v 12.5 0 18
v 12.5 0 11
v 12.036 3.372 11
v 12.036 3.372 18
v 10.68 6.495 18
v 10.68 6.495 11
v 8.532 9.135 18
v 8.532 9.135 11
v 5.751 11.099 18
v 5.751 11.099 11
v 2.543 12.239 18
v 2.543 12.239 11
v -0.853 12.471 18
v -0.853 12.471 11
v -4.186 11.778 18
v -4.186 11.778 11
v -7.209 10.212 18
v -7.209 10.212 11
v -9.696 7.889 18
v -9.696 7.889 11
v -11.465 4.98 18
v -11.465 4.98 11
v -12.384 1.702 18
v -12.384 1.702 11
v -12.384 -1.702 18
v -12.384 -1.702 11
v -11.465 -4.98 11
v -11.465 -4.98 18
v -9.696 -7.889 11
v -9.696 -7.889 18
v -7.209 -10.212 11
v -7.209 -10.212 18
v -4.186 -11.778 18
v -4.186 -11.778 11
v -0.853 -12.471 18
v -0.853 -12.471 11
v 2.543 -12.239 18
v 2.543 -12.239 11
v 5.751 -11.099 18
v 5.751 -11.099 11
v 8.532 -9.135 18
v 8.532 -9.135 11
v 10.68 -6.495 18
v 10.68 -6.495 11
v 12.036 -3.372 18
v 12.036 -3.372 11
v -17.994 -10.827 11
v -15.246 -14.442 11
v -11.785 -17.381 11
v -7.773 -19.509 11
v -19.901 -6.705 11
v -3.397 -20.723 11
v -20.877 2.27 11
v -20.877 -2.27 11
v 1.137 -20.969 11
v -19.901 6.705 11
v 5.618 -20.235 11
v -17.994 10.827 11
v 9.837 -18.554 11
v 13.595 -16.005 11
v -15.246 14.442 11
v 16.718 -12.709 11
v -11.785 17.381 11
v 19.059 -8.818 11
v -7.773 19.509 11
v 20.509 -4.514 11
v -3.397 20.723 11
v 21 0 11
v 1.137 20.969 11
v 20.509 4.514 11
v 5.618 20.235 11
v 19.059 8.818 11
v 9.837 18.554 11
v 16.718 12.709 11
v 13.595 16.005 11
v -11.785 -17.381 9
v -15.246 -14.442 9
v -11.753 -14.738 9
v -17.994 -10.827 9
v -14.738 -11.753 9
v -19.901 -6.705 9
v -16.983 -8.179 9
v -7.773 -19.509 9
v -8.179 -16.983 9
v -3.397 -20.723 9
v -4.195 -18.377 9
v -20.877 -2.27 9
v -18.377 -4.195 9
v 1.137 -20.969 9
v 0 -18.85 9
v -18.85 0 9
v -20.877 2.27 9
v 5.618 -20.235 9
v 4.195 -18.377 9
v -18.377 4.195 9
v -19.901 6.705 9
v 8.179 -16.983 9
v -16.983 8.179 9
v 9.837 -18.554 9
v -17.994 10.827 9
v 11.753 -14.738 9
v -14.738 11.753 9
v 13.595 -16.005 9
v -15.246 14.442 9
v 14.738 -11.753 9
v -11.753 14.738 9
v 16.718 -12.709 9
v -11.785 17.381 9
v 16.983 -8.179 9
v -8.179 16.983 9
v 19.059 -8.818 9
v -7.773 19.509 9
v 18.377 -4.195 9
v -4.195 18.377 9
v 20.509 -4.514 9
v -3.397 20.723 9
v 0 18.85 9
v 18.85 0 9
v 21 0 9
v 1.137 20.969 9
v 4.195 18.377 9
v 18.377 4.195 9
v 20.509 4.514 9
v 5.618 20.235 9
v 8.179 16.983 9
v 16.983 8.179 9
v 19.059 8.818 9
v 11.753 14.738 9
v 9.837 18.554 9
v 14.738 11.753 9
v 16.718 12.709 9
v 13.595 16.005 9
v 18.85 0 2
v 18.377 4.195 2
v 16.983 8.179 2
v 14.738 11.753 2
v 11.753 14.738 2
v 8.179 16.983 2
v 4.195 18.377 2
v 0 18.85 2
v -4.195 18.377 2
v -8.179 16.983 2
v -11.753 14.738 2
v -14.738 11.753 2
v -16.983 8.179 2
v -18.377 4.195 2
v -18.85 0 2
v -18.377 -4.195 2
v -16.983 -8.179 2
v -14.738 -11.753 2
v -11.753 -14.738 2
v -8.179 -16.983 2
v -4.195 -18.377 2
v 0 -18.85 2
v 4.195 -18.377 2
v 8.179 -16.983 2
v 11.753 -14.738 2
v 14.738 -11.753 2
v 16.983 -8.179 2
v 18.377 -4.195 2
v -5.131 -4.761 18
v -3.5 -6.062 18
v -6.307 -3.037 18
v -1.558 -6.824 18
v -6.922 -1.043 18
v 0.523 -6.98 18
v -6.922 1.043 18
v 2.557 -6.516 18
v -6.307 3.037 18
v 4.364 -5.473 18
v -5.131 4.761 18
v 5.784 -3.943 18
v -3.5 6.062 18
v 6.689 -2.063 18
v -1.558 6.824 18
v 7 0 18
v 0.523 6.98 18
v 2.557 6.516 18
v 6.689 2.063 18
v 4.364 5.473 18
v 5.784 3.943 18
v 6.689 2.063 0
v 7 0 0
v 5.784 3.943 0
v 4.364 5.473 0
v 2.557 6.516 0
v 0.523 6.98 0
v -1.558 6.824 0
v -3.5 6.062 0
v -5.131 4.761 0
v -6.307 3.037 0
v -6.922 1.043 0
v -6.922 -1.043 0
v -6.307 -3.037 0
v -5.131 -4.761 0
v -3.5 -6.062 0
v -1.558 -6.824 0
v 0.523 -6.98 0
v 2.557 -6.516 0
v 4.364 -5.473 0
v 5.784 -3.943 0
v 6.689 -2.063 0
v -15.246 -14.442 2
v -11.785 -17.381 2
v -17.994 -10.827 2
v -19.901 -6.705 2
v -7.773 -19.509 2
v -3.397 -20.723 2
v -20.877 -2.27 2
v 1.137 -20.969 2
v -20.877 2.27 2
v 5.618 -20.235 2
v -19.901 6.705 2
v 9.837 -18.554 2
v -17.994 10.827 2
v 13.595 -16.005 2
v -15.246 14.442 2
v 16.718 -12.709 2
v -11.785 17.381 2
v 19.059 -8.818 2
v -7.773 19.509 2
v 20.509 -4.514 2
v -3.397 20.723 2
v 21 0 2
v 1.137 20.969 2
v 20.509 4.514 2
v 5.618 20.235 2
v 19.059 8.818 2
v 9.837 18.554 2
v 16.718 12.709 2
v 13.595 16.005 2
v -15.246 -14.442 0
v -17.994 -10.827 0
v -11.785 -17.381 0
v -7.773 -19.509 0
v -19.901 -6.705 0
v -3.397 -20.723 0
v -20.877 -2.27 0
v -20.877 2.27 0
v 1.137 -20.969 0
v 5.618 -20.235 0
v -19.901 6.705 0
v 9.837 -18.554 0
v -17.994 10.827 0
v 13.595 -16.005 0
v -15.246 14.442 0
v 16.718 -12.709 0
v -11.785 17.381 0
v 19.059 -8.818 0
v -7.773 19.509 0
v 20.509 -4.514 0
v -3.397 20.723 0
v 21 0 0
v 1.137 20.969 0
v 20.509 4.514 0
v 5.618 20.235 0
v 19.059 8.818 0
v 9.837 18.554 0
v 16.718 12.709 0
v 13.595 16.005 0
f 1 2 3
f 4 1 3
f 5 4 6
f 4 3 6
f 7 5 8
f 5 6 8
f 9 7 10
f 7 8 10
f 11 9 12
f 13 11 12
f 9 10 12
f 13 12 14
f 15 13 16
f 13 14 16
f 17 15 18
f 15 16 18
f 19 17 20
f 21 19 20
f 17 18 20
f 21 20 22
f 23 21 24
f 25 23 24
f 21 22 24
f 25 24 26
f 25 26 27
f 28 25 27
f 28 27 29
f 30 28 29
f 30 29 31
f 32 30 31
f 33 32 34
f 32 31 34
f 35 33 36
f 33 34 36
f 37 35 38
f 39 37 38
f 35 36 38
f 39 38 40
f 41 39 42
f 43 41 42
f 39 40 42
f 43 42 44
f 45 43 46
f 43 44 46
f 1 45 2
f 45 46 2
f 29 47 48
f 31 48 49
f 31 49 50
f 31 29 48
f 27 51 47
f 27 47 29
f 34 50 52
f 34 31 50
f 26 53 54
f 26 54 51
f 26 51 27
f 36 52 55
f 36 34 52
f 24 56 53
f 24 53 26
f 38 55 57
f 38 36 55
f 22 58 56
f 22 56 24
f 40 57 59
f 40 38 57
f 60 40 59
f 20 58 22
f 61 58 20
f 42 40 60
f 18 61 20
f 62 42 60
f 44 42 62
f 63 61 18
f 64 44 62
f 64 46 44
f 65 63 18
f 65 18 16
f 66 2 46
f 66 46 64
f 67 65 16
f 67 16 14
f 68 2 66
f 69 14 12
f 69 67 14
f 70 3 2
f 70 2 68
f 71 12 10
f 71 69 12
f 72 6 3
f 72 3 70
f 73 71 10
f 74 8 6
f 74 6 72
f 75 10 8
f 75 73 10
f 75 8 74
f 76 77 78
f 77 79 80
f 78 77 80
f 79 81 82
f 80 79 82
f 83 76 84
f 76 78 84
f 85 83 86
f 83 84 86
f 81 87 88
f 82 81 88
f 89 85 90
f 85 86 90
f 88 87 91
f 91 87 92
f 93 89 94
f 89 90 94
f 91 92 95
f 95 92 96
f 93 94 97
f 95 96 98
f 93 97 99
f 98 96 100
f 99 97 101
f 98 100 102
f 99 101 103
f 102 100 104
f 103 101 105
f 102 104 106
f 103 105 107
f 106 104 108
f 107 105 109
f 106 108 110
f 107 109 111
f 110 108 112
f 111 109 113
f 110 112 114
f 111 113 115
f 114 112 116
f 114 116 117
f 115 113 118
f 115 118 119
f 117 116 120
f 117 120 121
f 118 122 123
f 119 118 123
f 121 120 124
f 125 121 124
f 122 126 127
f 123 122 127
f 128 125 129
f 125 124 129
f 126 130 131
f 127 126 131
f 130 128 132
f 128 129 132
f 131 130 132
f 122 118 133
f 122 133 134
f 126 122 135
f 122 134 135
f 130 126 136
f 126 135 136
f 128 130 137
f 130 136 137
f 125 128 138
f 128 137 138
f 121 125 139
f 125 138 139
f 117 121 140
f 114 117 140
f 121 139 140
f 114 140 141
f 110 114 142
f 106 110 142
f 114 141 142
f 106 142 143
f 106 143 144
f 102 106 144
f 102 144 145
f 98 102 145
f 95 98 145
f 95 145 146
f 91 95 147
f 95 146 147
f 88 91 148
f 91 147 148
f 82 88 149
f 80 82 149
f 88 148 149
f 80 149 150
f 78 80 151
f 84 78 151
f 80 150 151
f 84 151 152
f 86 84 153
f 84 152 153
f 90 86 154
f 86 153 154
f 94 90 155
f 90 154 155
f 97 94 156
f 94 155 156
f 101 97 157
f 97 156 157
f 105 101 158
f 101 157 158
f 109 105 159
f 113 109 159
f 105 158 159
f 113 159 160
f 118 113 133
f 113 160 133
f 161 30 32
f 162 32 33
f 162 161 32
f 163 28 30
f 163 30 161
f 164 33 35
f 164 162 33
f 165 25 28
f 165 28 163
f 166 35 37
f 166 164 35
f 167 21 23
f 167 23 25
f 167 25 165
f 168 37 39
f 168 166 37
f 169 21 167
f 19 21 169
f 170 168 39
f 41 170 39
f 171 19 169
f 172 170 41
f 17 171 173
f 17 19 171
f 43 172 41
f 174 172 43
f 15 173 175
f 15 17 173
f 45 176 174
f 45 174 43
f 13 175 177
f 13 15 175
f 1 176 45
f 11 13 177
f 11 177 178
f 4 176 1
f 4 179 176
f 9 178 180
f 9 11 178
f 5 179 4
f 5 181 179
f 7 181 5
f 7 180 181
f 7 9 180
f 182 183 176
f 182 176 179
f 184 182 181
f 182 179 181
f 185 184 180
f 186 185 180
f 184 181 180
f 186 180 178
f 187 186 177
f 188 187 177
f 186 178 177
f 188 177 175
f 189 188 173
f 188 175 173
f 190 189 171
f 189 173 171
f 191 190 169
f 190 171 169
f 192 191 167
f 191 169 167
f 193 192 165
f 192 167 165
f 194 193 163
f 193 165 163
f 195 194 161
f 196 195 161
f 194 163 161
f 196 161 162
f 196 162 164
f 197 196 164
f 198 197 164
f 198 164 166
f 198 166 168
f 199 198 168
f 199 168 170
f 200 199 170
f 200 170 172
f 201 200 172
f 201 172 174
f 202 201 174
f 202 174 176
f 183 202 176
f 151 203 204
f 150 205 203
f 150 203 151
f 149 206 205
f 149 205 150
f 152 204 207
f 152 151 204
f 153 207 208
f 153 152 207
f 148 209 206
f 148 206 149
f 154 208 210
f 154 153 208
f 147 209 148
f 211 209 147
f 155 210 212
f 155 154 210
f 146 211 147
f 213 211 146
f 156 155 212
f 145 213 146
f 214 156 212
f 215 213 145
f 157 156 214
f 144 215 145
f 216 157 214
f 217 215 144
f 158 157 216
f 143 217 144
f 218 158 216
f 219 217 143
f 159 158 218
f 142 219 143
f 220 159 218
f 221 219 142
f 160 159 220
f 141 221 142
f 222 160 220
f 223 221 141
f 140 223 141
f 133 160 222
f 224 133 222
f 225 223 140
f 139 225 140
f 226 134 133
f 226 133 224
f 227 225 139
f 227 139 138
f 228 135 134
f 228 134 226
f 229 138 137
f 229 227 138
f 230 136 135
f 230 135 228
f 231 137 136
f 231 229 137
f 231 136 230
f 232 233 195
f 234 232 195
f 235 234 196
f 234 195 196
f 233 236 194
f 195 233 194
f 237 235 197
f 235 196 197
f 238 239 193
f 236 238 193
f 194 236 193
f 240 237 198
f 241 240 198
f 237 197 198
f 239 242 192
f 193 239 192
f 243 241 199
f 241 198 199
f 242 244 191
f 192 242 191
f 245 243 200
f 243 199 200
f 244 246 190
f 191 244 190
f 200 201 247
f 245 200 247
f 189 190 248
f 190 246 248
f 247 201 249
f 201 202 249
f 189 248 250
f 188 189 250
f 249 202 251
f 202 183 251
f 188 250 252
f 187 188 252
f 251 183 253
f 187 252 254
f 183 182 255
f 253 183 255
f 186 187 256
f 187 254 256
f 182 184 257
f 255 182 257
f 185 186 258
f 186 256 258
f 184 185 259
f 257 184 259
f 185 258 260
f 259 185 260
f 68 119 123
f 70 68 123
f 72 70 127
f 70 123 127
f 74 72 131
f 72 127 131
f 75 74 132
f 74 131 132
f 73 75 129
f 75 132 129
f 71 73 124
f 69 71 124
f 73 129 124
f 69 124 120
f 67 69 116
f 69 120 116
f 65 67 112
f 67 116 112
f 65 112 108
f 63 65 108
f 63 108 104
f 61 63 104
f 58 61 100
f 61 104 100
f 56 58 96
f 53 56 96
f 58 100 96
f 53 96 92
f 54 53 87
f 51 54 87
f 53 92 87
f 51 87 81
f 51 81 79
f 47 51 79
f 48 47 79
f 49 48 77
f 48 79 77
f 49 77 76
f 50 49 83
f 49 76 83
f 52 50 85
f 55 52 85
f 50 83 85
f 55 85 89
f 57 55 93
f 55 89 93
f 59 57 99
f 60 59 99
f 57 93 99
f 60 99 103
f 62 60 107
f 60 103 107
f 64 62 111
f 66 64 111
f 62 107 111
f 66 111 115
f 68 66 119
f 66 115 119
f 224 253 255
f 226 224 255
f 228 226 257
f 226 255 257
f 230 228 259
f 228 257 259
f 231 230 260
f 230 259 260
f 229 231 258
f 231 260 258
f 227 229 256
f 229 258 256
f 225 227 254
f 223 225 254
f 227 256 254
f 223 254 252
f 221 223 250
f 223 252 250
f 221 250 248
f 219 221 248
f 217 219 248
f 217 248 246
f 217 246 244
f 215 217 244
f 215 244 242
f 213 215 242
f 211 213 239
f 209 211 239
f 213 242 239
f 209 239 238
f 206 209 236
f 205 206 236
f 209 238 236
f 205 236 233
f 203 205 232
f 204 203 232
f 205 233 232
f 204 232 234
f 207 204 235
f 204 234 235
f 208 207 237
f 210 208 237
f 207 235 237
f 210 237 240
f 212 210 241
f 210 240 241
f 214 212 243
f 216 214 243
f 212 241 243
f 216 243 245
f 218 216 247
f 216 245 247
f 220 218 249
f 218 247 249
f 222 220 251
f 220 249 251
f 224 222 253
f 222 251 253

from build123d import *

# Parameters (mm, degrees)
SKETCH_1_R          = 21
EXTRUDE_1_DEPTH     = 2
SKETCH_2_R          = 18.85
EXTRUDE_2_DEPTH     = 7
SKETCH_3_R          = 21
EXTRUDE_3_DEPTH     = 2
SKETCH_4_R          = 12.5
EXTRUDE_4_DEPTH     = 7
SKETCH_5_R          = 7
CUT_EXTRUDE_1_DEPTH = 35.727510708


with BuildPart() as part:
    # 草图1 → 凸台-拉伸1 (new body)
    with BuildSketch(Plane.XY):
        Circle(SKETCH_1_R)
    extrude(amount=EXTRUDE_1_DEPTH)

    # 草图2 → 凸台-拉伸2 (add)
    with BuildSketch(Plane.XY.offset(2)):
        Circle(SKETCH_2_R)
    extrude(amount=EXTRUDE_2_DEPTH)

    # 草图3 → 凸台-拉伸3 (add)
    with BuildSketch(Plane.XY.offset(9)):
        Circle(SKETCH_3_R)
    extrude(amount=EXTRUDE_3_DEPTH)

    # 草图4 → 凸台-拉伸4 (add)
    with BuildSketch(Plane.XY.offset(11)):
        Circle(SKETCH_4_R)
    extrude(amount=EXTRUDE_4_DEPTH)

    # 草图5 → 切除-拉伸1 (cut, through all)
    with BuildSketch(Plane.XY.offset(18)):
        Circle(SKETCH_5_R)
    extrude(amount=-CUT_EXTRUDE_1_DEPTH, mode=Mode.SUBTRACT)


solid = part.part
